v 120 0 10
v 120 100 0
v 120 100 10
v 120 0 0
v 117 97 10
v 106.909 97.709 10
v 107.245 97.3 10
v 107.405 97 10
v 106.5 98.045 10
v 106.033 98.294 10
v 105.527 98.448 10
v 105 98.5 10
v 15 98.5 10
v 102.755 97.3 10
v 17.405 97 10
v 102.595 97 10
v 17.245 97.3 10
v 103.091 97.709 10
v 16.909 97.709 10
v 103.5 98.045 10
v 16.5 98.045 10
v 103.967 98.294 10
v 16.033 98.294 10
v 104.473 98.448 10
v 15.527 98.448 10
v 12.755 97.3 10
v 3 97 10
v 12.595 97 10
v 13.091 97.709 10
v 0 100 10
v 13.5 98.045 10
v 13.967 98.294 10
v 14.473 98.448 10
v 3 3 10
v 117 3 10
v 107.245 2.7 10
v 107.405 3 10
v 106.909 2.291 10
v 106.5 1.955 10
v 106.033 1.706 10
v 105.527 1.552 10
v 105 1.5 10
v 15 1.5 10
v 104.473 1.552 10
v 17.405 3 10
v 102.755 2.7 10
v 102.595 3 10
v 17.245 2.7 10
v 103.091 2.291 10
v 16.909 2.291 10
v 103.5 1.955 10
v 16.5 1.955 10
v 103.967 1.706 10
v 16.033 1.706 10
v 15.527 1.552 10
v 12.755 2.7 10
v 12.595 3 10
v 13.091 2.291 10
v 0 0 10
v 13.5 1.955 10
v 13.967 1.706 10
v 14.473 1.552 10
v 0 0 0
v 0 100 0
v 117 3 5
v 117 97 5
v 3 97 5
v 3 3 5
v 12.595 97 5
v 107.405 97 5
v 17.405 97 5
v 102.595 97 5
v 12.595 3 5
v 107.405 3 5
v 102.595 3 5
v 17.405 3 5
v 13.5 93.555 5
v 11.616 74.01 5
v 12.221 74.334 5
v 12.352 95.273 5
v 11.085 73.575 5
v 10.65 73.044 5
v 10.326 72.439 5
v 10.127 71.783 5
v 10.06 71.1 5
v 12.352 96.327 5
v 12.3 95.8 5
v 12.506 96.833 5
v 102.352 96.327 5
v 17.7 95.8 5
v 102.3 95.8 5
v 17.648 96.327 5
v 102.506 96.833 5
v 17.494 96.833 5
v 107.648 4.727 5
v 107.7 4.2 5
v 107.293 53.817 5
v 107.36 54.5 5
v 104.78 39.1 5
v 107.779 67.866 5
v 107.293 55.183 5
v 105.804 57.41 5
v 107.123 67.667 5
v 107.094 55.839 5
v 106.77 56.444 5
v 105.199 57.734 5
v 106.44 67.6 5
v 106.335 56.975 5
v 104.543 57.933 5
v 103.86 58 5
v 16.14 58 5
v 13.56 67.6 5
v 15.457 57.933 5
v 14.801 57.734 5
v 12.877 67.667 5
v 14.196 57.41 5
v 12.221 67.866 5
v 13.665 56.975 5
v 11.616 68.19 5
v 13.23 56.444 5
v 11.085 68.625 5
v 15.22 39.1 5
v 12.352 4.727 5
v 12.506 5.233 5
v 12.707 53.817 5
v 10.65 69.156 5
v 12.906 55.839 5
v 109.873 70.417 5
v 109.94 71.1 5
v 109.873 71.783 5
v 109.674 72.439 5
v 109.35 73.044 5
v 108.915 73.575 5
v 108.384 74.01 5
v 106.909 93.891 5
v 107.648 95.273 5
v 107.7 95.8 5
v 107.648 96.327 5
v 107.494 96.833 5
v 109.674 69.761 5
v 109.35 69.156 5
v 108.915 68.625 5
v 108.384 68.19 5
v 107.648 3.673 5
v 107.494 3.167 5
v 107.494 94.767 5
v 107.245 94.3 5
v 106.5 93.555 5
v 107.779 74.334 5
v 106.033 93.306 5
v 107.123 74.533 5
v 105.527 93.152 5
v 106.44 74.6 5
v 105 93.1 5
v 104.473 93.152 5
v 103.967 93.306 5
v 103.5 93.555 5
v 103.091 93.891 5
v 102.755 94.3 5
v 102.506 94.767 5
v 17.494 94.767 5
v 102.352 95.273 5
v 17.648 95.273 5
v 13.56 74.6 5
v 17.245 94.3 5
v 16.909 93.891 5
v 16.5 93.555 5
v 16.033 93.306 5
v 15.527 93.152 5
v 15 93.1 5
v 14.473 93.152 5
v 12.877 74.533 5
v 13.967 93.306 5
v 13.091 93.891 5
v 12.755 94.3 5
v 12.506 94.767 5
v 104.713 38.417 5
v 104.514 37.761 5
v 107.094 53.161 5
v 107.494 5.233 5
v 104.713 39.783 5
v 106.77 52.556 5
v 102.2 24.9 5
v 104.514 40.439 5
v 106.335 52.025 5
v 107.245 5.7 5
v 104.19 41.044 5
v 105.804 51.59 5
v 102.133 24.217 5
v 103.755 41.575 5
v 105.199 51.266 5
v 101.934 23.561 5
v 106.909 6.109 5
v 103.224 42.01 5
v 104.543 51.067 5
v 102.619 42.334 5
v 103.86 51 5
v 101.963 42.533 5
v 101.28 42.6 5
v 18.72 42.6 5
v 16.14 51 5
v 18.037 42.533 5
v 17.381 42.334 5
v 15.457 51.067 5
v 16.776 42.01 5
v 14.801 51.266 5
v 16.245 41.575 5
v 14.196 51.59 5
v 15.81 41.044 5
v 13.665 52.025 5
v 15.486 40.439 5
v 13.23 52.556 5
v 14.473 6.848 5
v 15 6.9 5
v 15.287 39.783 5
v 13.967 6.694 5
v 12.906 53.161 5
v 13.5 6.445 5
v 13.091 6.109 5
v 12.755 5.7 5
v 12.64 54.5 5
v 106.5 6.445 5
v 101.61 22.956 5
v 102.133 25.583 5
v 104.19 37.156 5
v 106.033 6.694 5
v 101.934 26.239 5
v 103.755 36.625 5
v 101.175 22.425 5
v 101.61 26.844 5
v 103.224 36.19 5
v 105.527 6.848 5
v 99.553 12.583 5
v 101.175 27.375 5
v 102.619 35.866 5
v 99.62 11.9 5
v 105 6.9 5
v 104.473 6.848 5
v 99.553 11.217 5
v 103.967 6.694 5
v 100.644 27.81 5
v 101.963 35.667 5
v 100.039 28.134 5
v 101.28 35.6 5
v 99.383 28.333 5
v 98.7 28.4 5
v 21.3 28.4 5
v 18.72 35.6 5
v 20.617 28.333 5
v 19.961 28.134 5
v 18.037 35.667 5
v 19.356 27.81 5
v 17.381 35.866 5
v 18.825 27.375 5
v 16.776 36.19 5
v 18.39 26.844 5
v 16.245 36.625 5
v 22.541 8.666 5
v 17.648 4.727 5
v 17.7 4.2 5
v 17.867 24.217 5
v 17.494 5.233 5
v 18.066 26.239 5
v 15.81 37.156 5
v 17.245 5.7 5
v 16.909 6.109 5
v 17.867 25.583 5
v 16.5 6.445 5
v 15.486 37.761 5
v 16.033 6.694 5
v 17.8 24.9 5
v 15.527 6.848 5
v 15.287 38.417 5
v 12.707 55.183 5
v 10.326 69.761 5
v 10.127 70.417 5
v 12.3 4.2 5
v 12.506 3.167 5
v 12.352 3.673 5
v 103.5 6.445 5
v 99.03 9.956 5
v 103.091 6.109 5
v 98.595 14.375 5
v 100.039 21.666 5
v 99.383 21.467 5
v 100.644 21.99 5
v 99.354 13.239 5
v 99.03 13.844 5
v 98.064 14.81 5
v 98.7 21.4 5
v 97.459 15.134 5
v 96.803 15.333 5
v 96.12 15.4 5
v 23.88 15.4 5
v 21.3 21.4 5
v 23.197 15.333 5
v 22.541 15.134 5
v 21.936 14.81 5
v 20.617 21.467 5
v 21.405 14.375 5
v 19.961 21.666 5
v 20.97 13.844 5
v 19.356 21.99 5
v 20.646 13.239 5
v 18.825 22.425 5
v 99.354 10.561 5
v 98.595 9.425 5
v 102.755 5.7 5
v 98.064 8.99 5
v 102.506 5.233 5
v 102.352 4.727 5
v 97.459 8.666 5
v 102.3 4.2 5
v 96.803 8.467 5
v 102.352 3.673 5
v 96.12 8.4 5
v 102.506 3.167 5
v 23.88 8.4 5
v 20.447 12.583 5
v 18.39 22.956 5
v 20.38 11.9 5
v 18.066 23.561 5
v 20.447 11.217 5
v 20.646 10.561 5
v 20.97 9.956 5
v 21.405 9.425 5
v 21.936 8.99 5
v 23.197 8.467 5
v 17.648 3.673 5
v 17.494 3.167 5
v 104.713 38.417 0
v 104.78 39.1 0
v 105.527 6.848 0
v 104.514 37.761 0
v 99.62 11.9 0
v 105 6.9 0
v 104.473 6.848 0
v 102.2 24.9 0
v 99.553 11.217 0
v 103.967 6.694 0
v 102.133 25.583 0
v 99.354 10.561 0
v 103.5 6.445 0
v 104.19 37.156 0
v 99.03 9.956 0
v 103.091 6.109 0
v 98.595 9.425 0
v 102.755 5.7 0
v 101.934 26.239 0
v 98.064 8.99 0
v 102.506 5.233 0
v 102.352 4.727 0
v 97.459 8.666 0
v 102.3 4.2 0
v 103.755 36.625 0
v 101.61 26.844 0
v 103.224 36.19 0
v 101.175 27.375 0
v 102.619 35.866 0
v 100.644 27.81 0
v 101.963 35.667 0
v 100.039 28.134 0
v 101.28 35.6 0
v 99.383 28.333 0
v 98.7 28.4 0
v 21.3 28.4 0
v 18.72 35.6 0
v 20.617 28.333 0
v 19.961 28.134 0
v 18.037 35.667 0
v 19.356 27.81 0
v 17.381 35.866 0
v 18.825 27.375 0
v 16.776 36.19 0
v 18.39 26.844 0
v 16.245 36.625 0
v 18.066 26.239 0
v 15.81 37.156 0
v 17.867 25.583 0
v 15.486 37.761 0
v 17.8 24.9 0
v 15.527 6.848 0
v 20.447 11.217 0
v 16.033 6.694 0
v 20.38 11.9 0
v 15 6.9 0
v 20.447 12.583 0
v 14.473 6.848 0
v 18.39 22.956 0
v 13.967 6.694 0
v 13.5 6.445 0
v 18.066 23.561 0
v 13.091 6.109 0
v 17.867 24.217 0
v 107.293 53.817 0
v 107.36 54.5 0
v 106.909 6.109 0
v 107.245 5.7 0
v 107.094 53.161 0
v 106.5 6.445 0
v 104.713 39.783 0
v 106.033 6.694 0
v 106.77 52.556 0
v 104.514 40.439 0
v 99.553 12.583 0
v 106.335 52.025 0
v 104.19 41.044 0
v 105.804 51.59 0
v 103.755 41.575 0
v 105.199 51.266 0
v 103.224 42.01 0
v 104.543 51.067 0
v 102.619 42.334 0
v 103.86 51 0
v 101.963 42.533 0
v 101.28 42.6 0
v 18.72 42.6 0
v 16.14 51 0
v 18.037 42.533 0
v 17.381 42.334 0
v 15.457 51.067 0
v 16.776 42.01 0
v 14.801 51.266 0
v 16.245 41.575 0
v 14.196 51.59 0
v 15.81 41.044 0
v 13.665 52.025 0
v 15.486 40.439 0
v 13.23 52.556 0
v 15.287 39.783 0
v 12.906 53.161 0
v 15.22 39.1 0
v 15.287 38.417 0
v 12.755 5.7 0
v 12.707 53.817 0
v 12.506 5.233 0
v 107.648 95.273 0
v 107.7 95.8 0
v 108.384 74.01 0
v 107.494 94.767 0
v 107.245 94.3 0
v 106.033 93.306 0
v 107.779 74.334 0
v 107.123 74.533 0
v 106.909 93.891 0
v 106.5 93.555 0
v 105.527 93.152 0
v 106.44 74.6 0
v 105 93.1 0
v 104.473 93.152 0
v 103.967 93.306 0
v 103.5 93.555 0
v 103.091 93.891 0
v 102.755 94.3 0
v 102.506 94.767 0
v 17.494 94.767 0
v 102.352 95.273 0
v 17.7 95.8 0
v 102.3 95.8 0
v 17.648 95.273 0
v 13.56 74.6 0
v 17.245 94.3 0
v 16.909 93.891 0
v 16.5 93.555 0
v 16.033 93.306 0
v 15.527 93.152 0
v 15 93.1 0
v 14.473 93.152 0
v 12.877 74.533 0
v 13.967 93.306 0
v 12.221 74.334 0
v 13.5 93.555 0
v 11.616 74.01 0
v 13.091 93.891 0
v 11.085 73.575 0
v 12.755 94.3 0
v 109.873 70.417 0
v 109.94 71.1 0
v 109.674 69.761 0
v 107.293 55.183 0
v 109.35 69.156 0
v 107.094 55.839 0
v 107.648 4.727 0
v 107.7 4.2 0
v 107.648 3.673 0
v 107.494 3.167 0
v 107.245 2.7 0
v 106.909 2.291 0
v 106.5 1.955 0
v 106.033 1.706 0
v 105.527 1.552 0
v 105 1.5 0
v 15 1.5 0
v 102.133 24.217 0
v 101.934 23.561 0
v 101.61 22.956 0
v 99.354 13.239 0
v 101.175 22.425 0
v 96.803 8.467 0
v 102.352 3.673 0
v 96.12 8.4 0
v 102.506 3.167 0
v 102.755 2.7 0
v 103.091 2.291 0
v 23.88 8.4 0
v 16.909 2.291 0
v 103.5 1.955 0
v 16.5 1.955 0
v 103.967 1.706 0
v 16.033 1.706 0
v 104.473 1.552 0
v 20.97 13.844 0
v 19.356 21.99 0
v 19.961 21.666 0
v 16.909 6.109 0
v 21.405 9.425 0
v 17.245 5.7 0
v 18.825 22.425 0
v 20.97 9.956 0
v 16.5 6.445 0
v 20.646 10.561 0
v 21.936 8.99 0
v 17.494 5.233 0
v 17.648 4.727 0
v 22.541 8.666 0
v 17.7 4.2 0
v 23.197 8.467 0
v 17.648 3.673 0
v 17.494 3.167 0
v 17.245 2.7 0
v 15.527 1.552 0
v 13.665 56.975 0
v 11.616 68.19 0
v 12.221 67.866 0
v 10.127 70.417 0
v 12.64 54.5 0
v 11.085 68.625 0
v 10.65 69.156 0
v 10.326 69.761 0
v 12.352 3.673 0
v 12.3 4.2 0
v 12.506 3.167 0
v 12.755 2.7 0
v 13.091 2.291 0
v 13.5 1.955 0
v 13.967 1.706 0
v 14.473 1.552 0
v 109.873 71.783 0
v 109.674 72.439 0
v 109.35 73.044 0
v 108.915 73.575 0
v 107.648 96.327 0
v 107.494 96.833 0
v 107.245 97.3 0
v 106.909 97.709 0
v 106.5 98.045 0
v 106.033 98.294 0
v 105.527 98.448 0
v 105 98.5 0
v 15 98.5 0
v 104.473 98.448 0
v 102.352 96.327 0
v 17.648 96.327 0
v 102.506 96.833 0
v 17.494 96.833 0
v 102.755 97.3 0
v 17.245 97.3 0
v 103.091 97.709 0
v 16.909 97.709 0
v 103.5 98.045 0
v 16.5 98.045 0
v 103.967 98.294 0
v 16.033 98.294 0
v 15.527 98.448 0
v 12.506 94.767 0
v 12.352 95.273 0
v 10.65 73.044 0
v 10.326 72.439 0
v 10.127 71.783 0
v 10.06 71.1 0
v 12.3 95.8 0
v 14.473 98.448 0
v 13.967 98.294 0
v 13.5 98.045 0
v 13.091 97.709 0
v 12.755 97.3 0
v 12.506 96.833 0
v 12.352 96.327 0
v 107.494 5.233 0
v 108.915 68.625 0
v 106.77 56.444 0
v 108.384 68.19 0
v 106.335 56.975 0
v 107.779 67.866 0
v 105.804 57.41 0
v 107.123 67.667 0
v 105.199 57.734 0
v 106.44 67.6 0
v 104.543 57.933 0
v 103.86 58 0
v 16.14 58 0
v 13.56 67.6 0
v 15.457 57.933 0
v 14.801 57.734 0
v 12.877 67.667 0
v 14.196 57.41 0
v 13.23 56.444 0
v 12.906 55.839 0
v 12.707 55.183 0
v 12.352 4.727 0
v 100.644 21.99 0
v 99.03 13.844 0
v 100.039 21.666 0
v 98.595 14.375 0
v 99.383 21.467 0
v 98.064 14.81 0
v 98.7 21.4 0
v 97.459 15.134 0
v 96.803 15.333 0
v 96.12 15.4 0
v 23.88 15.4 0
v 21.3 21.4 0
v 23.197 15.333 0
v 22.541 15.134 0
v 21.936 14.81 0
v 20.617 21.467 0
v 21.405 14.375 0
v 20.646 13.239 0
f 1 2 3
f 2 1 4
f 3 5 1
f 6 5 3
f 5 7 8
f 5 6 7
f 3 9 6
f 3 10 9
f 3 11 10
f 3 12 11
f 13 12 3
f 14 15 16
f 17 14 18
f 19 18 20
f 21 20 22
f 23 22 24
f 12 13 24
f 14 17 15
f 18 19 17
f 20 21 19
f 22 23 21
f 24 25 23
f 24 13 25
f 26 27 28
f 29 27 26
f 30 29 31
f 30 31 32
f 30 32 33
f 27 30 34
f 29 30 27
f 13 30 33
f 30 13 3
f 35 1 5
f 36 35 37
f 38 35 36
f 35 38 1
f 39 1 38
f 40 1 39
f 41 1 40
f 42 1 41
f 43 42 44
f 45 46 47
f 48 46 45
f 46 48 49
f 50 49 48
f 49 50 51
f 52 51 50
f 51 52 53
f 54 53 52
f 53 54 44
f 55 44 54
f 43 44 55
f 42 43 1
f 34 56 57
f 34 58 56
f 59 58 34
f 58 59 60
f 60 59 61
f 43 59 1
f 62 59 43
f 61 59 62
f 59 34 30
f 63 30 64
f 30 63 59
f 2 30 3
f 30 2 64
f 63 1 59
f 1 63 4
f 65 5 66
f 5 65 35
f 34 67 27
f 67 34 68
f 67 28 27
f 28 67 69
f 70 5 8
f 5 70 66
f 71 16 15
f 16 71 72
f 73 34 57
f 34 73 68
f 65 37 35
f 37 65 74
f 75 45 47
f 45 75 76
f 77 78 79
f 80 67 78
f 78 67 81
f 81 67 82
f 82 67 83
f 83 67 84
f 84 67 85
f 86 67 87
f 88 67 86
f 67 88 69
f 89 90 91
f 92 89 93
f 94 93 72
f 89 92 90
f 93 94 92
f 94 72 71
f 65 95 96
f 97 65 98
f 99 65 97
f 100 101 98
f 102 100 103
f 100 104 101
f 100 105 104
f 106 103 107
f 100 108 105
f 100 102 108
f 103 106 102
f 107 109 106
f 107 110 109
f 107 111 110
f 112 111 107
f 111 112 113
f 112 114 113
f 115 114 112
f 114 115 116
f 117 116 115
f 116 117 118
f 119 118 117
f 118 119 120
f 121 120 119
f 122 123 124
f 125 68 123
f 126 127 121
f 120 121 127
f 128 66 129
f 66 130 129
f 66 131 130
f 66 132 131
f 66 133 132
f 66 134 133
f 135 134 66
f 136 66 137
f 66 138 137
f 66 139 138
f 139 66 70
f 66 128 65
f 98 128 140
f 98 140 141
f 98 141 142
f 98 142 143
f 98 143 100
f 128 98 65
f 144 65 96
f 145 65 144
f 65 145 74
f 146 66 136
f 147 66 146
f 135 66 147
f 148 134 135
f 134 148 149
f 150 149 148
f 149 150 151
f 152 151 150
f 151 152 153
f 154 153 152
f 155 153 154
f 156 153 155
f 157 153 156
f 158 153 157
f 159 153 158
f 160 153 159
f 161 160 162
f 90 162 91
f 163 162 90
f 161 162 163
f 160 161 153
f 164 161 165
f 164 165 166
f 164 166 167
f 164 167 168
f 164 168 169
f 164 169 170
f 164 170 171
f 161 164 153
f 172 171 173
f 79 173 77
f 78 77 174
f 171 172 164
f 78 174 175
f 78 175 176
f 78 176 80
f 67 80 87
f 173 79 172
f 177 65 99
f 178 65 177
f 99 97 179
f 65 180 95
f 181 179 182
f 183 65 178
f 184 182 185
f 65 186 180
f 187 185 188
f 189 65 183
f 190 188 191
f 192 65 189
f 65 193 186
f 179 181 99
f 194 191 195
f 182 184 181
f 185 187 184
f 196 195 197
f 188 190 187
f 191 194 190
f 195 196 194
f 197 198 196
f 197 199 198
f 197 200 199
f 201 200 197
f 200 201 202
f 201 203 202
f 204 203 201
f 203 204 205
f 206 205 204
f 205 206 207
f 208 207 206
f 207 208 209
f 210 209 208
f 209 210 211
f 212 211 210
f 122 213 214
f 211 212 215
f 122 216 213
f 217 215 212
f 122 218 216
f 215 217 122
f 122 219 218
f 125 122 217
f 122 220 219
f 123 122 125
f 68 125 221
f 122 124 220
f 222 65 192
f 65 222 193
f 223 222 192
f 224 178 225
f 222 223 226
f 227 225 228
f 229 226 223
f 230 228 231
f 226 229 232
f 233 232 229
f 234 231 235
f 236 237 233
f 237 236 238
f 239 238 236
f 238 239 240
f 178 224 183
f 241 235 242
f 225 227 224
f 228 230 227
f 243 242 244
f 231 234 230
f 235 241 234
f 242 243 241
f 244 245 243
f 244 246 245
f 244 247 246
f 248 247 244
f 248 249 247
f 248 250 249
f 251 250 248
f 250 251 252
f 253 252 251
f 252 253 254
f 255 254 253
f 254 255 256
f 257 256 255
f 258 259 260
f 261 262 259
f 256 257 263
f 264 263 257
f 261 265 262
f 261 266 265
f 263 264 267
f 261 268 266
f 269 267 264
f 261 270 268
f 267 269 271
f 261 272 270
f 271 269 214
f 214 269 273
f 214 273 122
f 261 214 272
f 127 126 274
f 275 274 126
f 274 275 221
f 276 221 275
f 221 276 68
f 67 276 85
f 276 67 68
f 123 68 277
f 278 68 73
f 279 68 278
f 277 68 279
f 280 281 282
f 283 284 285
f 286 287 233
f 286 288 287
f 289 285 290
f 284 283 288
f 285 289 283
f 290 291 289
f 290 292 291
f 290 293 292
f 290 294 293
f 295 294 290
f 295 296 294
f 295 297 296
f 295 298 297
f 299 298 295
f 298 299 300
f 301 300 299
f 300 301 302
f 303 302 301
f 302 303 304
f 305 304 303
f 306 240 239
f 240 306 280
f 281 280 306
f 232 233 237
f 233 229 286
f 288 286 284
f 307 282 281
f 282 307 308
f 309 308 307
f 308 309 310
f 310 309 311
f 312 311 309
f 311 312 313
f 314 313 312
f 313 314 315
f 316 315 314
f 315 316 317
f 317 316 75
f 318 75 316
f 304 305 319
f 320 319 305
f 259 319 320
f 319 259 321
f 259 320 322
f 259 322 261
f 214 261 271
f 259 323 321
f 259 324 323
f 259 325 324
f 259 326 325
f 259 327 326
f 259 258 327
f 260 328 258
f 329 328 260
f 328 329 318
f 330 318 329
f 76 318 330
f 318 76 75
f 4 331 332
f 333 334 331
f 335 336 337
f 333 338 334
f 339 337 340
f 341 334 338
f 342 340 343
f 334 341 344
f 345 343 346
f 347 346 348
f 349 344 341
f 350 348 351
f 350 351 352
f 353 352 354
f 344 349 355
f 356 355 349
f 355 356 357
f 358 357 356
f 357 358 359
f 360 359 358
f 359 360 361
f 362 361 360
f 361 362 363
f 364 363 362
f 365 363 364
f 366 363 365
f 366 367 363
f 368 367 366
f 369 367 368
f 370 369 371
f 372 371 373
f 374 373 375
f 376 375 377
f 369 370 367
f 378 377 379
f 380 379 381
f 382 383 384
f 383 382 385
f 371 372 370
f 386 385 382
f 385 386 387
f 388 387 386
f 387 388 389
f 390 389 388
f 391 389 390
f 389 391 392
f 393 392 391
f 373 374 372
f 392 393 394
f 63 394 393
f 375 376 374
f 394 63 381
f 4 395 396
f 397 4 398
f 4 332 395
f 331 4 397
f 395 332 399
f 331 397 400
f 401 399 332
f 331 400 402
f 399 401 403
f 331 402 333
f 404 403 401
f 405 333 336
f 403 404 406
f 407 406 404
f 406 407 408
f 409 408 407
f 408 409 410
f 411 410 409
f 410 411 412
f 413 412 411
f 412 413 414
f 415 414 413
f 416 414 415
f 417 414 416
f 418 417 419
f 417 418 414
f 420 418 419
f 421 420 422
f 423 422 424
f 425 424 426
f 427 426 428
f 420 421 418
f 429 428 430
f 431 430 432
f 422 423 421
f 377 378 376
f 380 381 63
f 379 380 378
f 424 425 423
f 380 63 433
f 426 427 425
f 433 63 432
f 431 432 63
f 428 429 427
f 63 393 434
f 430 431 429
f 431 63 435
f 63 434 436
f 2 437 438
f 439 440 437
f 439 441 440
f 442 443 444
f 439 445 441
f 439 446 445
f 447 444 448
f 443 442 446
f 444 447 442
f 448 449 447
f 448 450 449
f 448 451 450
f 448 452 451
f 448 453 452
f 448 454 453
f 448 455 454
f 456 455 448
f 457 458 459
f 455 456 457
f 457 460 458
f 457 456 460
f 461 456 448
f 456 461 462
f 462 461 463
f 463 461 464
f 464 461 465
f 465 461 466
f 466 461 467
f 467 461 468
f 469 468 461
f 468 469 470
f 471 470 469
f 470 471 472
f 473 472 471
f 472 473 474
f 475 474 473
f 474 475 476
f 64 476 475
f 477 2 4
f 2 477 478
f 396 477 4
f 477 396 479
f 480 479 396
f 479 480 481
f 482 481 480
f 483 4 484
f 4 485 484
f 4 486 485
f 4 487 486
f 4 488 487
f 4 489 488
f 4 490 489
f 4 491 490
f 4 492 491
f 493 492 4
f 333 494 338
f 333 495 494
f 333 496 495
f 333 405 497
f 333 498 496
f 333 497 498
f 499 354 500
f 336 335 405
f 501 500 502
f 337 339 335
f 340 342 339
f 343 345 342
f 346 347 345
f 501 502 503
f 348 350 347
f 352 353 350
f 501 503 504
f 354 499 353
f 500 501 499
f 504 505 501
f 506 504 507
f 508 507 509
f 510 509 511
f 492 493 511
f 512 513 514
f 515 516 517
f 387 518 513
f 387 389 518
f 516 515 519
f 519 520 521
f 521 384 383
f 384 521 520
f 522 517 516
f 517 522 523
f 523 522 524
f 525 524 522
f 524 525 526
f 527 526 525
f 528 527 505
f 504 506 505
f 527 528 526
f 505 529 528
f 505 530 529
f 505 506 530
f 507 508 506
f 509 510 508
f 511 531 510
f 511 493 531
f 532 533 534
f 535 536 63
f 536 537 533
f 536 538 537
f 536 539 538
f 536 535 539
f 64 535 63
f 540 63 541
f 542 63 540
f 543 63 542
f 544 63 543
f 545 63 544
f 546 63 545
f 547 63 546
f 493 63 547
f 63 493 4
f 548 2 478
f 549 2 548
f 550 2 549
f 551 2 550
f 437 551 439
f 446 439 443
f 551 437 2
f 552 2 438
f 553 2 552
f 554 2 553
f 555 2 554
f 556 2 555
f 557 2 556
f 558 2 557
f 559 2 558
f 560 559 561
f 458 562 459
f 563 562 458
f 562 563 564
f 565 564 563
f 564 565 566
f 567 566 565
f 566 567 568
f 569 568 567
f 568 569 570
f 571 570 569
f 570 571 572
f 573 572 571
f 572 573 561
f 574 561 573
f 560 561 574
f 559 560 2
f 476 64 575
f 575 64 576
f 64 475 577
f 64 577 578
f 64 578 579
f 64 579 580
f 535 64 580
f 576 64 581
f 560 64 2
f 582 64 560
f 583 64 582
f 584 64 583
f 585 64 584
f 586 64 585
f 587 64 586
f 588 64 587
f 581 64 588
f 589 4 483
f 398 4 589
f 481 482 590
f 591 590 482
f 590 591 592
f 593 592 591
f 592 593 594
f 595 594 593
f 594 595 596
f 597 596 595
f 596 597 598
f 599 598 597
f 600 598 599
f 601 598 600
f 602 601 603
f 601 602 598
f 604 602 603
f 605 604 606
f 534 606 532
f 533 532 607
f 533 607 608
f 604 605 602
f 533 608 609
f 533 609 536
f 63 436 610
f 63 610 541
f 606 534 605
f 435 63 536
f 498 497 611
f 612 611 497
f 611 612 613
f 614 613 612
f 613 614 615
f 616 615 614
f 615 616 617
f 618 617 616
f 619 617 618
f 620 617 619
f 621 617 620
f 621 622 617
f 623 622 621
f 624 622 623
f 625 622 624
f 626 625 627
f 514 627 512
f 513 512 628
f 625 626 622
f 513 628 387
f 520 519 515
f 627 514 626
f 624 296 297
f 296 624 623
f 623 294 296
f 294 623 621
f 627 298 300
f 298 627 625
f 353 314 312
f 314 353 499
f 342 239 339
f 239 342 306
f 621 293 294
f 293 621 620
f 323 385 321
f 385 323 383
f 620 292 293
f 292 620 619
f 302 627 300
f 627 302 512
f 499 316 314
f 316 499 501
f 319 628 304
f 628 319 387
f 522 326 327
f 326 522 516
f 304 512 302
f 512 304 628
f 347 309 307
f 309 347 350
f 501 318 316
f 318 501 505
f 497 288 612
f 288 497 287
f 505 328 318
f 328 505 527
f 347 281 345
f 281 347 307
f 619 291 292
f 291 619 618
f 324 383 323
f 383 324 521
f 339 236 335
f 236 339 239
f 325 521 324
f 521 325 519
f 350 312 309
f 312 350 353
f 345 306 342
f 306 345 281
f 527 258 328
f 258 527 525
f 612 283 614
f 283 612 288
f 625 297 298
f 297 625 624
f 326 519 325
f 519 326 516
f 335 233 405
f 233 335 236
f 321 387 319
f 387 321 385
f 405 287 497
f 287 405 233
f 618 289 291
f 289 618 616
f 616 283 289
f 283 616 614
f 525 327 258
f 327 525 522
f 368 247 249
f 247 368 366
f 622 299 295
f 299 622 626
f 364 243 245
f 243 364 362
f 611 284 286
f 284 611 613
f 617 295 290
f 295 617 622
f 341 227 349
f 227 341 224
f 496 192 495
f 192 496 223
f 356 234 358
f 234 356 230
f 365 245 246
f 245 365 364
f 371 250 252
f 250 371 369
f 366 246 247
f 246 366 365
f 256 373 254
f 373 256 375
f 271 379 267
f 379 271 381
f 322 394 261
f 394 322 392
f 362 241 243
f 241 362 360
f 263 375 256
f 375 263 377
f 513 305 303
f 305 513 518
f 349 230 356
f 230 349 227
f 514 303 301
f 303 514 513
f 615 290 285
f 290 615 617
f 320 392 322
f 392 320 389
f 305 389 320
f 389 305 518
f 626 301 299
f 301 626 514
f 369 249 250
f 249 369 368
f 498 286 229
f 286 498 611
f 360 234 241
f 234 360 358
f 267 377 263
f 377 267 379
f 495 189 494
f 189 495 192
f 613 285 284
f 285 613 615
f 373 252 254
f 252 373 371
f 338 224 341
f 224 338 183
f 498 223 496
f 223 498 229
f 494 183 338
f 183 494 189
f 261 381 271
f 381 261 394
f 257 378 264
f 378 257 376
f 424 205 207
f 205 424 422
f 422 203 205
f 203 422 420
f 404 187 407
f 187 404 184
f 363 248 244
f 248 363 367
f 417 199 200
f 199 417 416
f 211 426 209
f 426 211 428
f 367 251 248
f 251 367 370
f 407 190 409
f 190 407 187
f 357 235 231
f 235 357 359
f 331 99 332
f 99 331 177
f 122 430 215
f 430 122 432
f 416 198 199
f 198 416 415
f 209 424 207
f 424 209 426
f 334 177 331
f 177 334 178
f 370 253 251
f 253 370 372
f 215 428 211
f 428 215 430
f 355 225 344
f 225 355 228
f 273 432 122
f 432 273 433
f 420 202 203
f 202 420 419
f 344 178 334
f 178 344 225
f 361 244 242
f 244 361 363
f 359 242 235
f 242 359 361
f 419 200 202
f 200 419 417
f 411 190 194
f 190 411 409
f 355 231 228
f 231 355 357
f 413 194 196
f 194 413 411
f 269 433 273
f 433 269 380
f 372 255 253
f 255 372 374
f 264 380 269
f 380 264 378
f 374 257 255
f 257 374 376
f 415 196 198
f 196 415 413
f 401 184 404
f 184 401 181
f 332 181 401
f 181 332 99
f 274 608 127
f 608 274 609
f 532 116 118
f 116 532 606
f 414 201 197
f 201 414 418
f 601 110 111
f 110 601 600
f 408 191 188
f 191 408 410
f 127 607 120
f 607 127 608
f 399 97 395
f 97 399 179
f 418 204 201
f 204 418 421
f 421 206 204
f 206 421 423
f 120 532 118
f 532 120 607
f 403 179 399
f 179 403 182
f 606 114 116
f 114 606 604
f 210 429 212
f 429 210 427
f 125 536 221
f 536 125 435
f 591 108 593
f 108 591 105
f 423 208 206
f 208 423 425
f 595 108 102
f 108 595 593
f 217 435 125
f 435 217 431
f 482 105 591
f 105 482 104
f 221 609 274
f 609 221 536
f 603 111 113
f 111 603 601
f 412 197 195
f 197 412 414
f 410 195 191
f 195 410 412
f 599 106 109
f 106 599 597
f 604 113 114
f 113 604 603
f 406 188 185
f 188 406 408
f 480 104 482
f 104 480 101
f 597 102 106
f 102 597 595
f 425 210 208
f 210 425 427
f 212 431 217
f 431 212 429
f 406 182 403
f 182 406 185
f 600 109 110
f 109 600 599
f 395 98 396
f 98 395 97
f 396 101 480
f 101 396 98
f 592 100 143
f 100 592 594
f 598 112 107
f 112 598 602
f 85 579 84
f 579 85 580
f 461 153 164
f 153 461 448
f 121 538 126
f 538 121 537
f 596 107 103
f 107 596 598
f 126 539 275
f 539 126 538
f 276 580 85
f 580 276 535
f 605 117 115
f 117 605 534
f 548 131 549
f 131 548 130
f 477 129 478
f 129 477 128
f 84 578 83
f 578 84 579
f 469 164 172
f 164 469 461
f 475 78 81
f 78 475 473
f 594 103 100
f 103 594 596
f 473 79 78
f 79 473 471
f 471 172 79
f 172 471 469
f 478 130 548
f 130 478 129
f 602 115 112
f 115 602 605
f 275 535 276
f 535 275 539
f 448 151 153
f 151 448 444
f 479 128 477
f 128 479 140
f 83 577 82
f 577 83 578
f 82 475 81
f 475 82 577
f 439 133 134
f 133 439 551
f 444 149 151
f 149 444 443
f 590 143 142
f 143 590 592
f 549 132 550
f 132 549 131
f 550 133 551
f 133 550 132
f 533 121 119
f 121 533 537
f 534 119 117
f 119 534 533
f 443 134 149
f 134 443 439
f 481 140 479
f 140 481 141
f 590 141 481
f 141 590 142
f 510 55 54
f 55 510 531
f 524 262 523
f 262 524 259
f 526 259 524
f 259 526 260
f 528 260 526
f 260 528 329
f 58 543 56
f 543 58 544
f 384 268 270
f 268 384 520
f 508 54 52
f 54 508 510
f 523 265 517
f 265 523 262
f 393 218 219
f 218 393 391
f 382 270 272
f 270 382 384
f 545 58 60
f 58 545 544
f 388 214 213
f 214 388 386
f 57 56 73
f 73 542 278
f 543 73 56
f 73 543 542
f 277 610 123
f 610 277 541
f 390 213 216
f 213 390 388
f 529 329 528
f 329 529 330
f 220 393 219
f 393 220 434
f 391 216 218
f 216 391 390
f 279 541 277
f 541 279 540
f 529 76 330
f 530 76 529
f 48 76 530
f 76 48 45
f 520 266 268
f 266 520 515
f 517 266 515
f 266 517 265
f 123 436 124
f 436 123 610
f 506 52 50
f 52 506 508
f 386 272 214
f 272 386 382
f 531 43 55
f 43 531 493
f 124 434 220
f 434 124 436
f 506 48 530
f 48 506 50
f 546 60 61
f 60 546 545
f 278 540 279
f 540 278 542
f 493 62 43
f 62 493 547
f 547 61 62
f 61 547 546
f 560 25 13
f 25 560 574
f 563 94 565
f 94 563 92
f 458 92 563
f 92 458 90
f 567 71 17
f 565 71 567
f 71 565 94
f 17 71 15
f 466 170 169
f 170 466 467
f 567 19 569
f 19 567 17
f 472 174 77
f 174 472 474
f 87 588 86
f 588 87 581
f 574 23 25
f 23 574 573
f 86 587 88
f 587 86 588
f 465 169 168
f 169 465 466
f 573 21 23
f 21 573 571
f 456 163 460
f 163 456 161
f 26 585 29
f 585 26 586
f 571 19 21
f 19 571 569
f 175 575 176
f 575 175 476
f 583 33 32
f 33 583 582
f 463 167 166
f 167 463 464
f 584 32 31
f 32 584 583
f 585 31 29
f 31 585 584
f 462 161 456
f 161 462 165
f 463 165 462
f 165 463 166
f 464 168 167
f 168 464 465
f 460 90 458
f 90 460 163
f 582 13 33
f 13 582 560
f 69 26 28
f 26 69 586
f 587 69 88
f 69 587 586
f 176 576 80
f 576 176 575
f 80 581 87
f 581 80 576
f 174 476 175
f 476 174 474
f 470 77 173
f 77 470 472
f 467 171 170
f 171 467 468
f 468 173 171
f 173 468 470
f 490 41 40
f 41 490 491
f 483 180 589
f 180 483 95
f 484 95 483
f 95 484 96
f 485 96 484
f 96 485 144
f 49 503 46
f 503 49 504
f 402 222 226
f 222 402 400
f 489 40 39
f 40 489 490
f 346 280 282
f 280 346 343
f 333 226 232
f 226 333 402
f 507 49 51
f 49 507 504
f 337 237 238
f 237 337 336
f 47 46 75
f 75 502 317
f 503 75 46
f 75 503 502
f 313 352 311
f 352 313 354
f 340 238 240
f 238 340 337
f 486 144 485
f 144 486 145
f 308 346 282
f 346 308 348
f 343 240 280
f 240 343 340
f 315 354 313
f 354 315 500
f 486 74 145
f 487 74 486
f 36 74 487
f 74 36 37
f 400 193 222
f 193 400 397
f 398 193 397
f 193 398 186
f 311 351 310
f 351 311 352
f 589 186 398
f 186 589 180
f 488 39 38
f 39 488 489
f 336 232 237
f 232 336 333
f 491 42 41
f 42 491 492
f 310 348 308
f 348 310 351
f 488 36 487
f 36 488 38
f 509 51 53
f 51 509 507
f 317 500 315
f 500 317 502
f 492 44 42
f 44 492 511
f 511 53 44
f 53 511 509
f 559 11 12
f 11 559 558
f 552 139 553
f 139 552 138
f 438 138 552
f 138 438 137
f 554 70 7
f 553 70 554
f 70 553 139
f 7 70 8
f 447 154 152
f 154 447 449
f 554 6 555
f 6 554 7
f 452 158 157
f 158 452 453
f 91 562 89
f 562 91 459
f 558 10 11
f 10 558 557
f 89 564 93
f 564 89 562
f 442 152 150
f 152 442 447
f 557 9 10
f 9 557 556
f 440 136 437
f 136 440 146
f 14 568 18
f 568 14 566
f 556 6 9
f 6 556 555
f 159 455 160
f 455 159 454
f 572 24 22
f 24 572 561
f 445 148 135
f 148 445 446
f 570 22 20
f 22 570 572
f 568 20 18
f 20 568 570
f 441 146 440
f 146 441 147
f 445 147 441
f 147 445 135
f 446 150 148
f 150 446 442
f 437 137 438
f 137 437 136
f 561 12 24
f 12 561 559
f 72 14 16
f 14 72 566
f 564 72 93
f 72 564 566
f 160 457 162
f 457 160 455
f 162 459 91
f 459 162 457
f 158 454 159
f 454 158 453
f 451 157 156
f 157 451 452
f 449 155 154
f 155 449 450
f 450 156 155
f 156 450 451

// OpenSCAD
$fn = 32;

// ----------------------------------------------------------------------
// Slotted panel: 120 x 100 mm, 5 рядов of slots
// ----------------------------------------------------------------------

// --- parameters (mm) ---
panel_w = 120;            // panel width
panel_d = 100;            // panel depth
thick = 5;                // panel thickness
slot_w = 7;               // slot width
pitch0 = 13;              // first row pitch
pitch_step = 1.2;         // pitch increase per row
margin = 8.4;             // margin around the slot field
rows = 5;                 // number of slot rows
mount_d = 5.4;            // mounting holes
mount_x = 45;             // mounting hole offset
rim_h = 10;               // rim height
rim_t = 3;                // rim wall thickness

difference() {
  union() {
    cube([panel_w, panel_d, thick]);
    translate([0, 0, thick - 1]) difference() {
      cube([panel_w, panel_d, rim_h - thick + 1]);
      translate([rim_t, rim_t, -2.5]) cube([panel_w - 2 * rim_t, panel_d - 2 * rim_t, rim_h - thick + 6]);
    }
  }
  /* slot rows: stadium shaped cutters, 2.5 mm clear of both faces */
  /* row 0: pitch 13, length 72.24 */
  hull() {
    translate([23.88, 11.9, -2.5]) cylinder(h = thick + 5, d = slot_w);
    translate([96.12, 11.9, -2.5]) cylinder(h = thick + 5, d = slot_w);
  }
  /* row 1: pitch 14.2, length 77.4 */
  hull() {
    translate([21.3, 24.9, -2.5]) cylinder(h = thick + 5, d = slot_w);
    translate([98.7, 24.9, -2.5]) cylinder(h = thick + 5, d = slot_w);
  }
  /* row 2: pitch 15.4, length 82.56 */
  hull() {
    translate([18.72, 39.1, -2.5]) cylinder(h = thick + 5, d = slot_w);
    translate([101.28, 39.1, -2.5]) cylinder(h = thick + 5, d = slot_w);
  }
  /* row 3: pitch 16.6, length 87.72 */
  hull() {
    translate([16.14, 54.5, -2.5]) cylinder(h = thick + 5, d = slot_w);
    translate([103.86, 54.5, -2.5]) cylinder(h = thick + 5, d = slot_w);
  }
  /* row 4: pitch 17.8, length 92.88 */
  hull() {
    translate([13.56, 71.1, -2.5]) cylinder(h = thick + 5, d = slot_w);
    translate([106.44, 71.1, -2.5]) cylinder(h = thick + 5, d = slot_w);
  }
  translate([15, 4.2, -2.5]) cylinder(h = 15, d = mount_d);
  translate([15, 95.8, -2.5]) cylinder(h = 15, d = mount_d);
  translate([105, 4.2, -2.5]) cylinder(h = 15, d = mount_d);
  translate([105, 95.8, -2.5]) cylinder(h = 15, d = mount_d);
}
